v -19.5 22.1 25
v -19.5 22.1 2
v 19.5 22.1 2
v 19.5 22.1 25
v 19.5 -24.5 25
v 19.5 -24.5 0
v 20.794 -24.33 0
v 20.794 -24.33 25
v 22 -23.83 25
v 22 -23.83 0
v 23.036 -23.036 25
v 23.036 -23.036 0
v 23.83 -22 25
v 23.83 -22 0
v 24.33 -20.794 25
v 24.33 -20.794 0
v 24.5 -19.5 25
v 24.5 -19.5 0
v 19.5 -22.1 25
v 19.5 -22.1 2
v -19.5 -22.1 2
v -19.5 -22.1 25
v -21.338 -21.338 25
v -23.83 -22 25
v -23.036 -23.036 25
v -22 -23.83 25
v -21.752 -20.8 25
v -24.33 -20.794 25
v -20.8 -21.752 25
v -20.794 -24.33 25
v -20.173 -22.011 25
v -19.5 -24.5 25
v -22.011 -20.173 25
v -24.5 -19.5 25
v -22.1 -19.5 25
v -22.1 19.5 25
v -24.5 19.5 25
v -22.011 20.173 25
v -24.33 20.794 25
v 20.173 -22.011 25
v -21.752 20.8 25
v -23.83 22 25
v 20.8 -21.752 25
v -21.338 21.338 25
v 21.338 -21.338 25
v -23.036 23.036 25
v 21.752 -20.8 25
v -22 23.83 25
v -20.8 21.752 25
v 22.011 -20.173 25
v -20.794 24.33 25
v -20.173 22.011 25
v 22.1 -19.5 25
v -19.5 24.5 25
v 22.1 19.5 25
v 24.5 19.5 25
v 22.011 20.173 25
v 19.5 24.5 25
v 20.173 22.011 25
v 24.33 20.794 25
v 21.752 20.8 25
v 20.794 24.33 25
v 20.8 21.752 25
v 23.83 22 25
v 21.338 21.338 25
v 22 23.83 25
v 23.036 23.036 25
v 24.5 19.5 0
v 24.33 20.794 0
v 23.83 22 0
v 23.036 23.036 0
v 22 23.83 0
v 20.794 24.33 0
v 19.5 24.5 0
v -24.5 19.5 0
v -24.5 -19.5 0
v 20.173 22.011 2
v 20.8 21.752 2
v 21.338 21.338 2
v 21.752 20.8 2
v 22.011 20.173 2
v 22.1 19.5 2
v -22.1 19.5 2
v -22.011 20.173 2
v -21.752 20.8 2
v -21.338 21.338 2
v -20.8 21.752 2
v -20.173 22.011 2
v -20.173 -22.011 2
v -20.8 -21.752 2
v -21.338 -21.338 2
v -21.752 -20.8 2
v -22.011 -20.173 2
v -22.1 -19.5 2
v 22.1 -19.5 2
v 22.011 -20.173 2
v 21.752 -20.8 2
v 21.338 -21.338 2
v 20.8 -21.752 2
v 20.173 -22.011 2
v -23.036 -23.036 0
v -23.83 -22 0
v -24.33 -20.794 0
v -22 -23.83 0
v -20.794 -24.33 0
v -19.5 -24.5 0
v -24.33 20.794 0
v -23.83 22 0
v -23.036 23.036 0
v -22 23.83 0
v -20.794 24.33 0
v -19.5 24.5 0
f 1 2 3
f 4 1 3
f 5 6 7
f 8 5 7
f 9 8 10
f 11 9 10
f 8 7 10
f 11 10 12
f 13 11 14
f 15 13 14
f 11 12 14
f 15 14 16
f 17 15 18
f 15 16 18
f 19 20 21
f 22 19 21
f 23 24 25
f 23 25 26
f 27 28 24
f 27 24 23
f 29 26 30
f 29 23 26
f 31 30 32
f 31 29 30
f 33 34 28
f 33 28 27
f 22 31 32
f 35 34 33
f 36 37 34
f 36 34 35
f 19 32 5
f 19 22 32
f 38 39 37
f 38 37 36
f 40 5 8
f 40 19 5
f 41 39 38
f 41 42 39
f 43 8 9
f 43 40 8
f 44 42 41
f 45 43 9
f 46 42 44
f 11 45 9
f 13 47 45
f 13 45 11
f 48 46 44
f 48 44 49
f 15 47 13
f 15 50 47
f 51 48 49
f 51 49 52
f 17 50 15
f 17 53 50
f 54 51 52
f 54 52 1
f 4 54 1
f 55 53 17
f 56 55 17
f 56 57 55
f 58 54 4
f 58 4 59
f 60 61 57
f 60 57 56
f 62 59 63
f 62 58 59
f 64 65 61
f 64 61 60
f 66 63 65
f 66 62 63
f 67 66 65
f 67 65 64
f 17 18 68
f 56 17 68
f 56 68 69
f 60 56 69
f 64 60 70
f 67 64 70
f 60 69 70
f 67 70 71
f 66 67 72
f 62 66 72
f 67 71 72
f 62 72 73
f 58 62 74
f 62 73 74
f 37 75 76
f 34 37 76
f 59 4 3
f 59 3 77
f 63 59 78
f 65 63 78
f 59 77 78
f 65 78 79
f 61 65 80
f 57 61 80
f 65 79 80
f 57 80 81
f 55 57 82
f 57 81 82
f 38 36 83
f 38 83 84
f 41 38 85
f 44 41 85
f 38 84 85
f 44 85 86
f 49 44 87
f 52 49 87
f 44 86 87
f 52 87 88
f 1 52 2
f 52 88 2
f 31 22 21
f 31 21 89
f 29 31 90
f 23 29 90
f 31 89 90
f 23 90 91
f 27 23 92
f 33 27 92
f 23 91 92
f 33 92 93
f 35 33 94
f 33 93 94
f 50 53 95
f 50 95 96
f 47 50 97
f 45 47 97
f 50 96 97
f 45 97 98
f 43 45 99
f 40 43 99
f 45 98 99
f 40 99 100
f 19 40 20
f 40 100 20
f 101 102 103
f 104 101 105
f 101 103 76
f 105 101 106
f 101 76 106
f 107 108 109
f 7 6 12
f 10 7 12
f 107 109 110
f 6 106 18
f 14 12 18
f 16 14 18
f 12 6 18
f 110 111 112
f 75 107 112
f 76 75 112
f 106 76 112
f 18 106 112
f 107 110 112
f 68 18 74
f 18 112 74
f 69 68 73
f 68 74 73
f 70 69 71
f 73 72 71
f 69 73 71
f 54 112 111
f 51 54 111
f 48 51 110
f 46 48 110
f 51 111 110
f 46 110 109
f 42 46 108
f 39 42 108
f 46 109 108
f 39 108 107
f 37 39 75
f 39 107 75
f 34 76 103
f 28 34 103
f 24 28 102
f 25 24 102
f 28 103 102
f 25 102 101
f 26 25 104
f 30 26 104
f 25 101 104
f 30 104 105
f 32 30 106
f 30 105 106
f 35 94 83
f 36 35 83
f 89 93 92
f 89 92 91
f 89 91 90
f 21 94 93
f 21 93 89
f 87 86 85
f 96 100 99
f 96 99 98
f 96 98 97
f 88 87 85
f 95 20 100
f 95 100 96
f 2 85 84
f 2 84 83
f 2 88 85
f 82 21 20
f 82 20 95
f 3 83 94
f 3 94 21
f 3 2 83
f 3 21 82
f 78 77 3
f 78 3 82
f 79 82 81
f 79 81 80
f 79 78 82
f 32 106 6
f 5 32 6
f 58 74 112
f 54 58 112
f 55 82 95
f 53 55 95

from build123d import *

# Parameters (mm, degrees)
F1_DEPTH = 25
F2_DEPTH = 2


with BuildPart() as f1:
    # F0 (on Top) → F1 (new body)
    with BuildSketch(Plane.XY):
        with BuildLine():
            ThreePointArc((-19.5, 24.5), (-23.035534, 23.035534), (-24.5, 19.5))
            Line((-24.5, 19.5), (-24.5, -19.5))
            ThreePointArc((-24.5, -19.5), (-23.035534, -23.035534), (-19.5, -24.5))
            Line((-19.5, -24.5), (19.5, -24.5))
            ThreePointArc((19.5, -24.5), (23.035534, -23.035534), (24.5, -19.5))
            Line((24.5, -19.5), (24.5, 19.5))
            ThreePointArc((24.5, 19.5), (23.035534, 23.035534), (19.5, 24.5))
            Line((19.5, 24.5), (-19.5, 24.5))
        make_face()
        with BuildLine():
            Line((-22.1, -19.5), (-22.1, 19.5))
            ThreePointArc((-22.1, 19.5), (-21.338478, 21.338478), (-19.5, 22.1))
            Line((-19.5, 22.1), (19.5, 22.1))
            ThreePointArc((19.5, 22.1), (21.338478, 21.338478), (22.1, 19.5))
            Line((22.1, 19.5), (22.1, -19.5))
            ThreePointArc((22.1, -19.5), (21.338478, -21.338478), (19.5, -22.1))
            Line((19.5, -22.1), (-19.5, -22.1))
            ThreePointArc((-19.5, -22.1), (-21.338478, -21.338478), (-22.1, -19.5))
        make_face(mode=Mode.SUBTRACT)
    extrude(amount=F1_DEPTH)

    # F0 (on Top) → F2 (join)
    with BuildSketch(Plane.XY):
        with BuildLine():
            ThreePointArc((-19.5, 22.1), (-21.338478, 21.338478), (-22.1, 19.5))
            Line((-22.1, 19.5), (-22.1, -19.5))
            ThreePointArc((-22.1, -19.5), (-21.338478, -21.338478), (-19.5, -22.1))
            Line((-19.5, -22.1), (19.5, -22.1))
            ThreePointArc((19.5, -22.1), (21.338478, -21.338478), (22.1, -19.5))
            Line((22.1, -19.5), (22.1, 19.5))
            ThreePointArc((22.1, 19.5), (21.338478, 21.338478), (19.5, 22.1))
            Line((19.5, 22.1), (-19.5, 22.1))
        make_face()
    extrude(amount=F2_DEPTH)


solid = f1.part
